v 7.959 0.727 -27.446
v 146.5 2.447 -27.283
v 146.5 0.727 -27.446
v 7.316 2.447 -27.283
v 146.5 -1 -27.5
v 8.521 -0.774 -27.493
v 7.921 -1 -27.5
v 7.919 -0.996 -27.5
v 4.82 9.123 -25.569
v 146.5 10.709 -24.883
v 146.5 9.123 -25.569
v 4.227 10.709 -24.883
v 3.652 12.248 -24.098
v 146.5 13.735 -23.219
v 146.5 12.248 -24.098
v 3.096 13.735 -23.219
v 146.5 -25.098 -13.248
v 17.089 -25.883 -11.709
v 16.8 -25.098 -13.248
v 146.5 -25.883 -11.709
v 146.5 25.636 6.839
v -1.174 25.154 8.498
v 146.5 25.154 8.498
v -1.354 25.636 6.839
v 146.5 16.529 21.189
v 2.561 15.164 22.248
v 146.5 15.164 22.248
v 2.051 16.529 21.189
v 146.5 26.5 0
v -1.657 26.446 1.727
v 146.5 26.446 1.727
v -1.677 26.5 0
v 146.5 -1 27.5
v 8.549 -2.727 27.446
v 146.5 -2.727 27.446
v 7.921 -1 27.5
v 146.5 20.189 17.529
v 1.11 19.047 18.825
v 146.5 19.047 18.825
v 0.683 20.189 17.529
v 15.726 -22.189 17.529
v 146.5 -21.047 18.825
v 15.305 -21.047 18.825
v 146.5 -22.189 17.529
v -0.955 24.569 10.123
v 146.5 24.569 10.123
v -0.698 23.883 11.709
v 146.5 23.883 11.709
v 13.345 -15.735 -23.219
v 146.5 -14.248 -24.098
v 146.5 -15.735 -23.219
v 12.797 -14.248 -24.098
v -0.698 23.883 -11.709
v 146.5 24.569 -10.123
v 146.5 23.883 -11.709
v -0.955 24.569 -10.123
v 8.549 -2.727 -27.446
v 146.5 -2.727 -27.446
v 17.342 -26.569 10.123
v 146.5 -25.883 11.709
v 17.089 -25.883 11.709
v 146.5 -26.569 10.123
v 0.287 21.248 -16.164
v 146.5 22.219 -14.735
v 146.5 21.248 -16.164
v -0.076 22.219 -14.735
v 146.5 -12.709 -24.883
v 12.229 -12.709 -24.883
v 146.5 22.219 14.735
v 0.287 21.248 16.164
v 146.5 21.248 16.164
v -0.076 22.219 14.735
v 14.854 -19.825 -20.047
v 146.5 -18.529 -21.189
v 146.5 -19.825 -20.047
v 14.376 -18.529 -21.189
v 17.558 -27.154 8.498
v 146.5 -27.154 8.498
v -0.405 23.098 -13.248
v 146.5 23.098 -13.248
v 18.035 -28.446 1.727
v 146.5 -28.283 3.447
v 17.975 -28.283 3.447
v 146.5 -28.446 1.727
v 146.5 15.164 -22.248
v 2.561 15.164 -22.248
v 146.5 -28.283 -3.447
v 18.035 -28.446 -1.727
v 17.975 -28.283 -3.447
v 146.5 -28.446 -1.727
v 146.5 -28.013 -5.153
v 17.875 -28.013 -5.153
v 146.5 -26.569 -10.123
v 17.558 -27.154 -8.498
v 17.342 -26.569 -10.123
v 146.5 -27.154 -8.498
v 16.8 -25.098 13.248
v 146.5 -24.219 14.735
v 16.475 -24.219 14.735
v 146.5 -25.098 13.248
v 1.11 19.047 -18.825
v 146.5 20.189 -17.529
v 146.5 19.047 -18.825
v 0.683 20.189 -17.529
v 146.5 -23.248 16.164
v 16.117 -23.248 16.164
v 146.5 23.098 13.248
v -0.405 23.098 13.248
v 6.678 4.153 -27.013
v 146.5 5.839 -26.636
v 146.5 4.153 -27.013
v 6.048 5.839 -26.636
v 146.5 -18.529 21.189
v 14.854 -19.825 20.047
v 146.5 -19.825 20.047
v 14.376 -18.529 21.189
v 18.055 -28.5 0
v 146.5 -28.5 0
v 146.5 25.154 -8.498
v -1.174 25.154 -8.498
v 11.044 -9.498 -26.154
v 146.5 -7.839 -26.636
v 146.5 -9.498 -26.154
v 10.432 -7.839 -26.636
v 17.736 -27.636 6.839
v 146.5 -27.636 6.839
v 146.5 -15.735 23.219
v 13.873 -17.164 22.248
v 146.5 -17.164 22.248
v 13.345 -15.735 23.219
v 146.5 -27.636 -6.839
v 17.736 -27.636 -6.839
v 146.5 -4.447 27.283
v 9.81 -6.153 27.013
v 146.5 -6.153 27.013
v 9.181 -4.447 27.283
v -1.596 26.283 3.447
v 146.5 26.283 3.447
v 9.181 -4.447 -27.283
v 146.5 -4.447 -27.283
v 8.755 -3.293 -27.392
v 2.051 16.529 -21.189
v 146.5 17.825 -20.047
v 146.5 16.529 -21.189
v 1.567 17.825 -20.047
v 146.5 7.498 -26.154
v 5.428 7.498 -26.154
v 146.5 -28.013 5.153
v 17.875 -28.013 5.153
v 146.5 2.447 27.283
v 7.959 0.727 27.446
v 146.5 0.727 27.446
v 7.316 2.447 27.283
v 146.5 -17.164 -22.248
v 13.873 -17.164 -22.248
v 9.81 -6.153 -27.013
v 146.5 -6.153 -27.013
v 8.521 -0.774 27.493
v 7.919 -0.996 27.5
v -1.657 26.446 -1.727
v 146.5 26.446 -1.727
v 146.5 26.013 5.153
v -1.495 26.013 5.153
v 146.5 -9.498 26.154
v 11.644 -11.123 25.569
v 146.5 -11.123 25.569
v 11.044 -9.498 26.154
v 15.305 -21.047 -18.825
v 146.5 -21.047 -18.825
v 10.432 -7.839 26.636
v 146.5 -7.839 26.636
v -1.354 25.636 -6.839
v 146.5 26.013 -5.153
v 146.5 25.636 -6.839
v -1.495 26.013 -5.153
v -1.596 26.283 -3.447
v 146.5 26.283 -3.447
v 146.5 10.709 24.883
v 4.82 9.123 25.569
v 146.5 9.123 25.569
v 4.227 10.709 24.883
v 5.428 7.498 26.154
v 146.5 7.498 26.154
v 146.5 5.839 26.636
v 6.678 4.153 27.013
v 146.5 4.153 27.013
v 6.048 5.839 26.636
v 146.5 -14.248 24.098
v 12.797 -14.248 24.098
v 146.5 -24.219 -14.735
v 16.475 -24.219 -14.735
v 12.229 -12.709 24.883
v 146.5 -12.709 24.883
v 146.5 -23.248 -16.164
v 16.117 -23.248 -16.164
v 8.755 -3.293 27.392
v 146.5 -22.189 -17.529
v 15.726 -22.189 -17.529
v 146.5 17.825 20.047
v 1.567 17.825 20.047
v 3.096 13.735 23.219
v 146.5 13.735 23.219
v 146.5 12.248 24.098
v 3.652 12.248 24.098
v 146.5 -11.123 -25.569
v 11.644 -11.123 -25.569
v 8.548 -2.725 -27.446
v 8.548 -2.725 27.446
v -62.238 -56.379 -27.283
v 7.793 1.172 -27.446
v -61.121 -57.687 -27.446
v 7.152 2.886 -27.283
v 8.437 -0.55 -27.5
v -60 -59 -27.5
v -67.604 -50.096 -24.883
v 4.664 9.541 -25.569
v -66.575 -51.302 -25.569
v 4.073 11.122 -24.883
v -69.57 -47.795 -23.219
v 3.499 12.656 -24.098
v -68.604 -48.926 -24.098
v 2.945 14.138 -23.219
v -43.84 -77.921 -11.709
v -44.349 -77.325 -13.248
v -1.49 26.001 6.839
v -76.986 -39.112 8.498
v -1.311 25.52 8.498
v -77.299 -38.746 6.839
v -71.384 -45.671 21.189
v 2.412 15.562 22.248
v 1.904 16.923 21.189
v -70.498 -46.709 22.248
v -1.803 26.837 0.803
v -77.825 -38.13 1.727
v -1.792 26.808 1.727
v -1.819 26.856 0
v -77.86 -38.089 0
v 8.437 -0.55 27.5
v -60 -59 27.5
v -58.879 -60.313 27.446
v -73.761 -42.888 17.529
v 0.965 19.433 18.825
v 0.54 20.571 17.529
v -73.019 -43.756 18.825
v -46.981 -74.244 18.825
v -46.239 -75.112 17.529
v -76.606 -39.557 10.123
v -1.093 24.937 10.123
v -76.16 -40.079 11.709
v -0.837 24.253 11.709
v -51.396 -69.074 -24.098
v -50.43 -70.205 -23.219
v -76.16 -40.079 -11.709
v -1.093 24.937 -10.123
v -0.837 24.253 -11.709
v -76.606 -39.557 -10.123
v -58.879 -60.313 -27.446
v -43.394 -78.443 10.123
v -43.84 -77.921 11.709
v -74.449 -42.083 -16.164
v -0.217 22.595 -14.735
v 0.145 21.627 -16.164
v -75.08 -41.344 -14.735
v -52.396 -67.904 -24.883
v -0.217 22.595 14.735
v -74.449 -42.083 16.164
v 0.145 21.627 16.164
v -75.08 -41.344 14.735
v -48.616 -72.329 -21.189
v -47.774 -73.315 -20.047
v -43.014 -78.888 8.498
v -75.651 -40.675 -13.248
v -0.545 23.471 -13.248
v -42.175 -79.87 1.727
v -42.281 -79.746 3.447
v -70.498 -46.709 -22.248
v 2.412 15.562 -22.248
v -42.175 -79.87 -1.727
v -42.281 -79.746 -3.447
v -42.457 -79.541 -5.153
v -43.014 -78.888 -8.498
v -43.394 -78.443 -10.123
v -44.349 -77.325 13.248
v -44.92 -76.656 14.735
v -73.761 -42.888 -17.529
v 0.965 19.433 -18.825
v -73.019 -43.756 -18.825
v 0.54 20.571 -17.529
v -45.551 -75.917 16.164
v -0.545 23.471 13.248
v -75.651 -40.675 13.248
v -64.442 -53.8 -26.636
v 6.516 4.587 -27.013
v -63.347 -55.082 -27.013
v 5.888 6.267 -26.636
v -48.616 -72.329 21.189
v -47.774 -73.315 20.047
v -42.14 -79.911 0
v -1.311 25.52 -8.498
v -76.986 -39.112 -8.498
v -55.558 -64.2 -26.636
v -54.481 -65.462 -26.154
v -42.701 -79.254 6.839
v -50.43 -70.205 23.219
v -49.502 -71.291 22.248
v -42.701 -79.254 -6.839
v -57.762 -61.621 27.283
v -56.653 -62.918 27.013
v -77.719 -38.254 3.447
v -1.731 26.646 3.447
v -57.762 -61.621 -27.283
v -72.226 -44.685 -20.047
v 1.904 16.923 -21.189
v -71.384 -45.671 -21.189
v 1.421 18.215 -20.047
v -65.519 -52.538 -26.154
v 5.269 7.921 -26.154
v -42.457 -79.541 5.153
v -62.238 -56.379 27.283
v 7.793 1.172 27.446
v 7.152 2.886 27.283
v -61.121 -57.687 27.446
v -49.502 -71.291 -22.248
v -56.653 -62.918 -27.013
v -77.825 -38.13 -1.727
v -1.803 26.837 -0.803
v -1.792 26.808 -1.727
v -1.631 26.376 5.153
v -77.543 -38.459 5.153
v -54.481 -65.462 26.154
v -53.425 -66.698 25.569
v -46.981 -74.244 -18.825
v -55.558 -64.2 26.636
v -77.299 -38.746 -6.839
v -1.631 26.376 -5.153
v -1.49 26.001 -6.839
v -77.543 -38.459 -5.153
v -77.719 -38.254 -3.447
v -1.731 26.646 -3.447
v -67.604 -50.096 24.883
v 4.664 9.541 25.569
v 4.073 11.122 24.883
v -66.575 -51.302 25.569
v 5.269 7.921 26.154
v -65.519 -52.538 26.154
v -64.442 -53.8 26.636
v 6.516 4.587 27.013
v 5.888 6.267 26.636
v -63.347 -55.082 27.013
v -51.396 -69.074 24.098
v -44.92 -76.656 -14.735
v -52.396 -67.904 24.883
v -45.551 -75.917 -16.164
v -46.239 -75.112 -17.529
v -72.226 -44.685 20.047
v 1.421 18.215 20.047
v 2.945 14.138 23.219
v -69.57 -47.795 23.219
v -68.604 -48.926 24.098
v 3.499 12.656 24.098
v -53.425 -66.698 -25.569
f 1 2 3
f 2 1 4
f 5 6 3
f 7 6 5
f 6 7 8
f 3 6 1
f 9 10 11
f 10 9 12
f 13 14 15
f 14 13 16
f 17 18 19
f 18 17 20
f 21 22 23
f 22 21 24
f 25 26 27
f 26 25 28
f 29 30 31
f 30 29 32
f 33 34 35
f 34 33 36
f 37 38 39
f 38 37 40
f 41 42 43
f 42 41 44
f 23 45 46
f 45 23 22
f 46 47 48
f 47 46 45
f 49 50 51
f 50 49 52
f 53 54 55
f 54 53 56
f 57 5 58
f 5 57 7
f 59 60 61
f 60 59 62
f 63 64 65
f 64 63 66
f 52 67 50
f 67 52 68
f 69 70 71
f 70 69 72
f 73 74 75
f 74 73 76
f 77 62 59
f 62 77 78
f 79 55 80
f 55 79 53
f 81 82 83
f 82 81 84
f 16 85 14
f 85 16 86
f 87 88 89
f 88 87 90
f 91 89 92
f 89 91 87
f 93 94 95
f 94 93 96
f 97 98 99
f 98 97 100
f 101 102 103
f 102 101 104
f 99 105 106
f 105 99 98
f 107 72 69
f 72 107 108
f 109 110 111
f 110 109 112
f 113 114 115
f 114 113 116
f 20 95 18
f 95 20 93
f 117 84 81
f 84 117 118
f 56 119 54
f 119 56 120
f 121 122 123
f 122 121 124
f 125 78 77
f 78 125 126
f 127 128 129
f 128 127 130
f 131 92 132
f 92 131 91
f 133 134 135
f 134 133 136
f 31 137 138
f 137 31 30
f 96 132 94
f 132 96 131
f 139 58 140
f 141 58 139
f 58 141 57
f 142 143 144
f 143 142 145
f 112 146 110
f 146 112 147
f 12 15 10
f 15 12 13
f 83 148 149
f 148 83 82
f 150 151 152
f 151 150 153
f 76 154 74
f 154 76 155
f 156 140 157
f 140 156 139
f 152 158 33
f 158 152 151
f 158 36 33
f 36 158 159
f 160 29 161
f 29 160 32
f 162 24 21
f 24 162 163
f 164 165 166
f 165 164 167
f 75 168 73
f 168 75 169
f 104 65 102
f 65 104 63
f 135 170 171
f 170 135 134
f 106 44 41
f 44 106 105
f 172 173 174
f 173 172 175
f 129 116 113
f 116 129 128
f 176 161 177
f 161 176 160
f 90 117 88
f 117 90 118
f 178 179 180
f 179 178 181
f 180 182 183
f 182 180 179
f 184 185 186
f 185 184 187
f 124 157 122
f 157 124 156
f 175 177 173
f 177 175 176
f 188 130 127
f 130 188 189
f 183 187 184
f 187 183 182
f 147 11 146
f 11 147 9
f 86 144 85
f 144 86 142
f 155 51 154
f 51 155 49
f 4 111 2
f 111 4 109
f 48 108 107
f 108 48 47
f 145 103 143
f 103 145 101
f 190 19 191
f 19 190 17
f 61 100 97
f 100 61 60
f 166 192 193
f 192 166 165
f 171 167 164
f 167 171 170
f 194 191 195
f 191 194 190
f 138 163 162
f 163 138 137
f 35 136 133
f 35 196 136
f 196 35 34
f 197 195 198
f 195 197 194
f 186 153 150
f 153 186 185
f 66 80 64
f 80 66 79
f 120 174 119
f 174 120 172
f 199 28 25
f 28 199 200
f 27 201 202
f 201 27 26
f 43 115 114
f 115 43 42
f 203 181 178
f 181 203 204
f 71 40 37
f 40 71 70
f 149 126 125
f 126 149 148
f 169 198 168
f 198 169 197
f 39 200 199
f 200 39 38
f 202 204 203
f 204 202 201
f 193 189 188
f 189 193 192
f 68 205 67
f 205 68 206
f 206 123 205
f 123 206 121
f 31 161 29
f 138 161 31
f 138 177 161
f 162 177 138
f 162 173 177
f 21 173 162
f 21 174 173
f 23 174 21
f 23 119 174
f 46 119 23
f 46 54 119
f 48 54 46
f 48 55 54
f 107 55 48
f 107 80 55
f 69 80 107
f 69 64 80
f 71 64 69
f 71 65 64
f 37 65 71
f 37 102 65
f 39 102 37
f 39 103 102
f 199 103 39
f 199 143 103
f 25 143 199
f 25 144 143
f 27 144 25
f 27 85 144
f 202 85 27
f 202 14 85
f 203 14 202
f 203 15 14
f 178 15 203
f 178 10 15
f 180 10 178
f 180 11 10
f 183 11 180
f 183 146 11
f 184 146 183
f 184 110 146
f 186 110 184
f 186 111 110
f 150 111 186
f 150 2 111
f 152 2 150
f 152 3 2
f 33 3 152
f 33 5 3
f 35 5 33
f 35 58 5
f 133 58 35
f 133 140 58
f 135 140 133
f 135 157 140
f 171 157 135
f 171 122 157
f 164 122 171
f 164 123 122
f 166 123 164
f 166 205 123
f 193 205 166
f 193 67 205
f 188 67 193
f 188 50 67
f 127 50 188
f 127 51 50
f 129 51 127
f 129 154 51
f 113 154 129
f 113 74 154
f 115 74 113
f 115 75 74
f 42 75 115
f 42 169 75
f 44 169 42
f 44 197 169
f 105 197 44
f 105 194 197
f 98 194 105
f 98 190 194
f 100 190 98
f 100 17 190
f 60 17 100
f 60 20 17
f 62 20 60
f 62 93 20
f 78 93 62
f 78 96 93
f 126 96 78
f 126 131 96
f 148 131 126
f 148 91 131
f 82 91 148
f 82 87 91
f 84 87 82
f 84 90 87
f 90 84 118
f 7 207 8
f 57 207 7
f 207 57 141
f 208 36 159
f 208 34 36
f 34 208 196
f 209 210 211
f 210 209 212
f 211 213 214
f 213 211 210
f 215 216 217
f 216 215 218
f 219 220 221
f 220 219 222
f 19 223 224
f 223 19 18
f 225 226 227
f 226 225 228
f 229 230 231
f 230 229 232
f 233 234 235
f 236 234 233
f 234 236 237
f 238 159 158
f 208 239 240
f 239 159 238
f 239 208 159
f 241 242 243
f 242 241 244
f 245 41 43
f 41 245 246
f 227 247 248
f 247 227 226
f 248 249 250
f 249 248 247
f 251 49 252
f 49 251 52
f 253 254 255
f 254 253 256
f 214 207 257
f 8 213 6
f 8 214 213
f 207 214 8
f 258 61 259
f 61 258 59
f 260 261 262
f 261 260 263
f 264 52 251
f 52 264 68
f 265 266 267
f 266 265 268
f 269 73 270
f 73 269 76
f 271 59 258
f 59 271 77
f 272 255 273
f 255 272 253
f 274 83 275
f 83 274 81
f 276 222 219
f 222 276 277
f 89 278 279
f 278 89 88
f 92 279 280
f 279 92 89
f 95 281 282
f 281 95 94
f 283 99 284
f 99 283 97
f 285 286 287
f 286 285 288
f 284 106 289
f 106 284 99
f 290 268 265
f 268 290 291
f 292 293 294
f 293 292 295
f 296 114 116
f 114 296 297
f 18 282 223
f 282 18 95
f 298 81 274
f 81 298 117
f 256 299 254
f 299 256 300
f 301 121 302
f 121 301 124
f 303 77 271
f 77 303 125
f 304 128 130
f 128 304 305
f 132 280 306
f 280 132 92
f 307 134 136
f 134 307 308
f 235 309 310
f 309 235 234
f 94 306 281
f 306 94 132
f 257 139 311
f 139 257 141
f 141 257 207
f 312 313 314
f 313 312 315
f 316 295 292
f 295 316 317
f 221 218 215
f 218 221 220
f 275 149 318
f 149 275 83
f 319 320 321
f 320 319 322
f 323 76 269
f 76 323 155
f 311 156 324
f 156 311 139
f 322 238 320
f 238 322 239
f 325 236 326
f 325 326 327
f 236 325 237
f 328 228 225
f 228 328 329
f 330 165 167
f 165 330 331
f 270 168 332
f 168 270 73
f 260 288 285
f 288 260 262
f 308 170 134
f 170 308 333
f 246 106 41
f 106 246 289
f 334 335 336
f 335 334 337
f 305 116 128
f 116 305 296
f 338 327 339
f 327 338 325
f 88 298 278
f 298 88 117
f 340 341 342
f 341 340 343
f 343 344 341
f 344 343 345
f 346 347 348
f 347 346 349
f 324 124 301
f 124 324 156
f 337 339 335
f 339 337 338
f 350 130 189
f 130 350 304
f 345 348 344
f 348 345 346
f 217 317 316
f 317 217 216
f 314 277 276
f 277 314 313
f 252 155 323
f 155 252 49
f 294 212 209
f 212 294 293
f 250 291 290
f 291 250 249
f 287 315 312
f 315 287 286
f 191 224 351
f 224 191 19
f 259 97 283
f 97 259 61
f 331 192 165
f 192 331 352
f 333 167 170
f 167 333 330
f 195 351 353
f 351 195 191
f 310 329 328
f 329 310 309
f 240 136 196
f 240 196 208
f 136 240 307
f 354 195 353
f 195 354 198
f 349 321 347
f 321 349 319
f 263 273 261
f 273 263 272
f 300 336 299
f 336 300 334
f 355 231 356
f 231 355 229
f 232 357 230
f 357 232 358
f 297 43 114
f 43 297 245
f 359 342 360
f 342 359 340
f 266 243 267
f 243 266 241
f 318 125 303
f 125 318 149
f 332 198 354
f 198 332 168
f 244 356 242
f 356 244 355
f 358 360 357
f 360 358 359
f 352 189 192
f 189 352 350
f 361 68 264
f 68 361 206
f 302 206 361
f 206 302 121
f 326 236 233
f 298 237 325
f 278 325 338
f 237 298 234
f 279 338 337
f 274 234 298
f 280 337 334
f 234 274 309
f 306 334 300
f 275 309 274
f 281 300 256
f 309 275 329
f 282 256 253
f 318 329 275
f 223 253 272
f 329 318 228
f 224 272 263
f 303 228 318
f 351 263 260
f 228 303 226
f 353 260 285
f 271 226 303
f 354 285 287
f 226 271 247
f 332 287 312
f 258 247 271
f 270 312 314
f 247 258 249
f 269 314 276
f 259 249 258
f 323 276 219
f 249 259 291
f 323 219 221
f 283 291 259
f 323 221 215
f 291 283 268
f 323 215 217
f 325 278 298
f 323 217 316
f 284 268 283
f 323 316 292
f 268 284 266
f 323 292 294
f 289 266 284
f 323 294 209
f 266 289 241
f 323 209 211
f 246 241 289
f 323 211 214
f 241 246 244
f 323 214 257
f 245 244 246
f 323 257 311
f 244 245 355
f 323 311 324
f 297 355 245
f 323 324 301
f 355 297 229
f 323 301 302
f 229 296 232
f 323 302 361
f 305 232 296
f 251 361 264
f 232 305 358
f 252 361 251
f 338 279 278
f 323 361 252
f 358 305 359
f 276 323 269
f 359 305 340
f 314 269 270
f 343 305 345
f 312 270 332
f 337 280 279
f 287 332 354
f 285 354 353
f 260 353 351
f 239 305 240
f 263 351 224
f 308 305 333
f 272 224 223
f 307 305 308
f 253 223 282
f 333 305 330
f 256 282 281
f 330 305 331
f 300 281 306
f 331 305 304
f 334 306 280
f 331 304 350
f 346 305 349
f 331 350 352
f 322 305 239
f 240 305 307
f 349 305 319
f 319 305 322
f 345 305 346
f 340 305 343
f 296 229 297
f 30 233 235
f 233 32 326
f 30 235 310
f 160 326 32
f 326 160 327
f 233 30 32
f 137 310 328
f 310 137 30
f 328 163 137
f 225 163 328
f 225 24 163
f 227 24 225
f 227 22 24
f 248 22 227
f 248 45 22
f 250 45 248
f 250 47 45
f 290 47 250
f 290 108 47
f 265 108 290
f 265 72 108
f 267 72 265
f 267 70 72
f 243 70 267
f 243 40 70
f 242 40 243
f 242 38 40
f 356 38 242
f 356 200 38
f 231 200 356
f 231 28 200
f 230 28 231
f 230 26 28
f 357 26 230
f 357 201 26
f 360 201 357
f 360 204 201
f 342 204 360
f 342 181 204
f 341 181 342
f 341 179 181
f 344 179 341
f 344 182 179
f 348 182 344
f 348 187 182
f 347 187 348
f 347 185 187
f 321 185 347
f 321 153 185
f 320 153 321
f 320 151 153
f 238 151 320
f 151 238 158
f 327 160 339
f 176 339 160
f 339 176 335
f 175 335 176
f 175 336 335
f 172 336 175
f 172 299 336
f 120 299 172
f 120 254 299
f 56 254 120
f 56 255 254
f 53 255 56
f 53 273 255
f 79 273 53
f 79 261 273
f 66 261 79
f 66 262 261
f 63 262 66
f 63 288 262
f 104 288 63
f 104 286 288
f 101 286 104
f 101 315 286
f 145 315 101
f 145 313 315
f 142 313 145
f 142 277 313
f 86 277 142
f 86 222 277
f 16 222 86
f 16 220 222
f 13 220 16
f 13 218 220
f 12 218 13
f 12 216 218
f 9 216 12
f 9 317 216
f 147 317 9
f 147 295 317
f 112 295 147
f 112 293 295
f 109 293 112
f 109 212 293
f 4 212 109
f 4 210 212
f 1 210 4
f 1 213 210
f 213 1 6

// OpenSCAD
// file: variables.scad
circBrdT = 1.59; //exact
circBrdSolderSpace = 3;
ledBrdW = circBrdT + 0.4;
ledBrdL = 14.91;
ledBrdH = 14.91;
ledHousingD = 5.5 + 0.4;
ledHousingW = 9.58; 
microCtlrHousingW = 50.84 + 1; 
microCtlrHousingL = 30.5 + 1; 
microCtlrHousingH = 19 + 1; 
switchHousingW = 22.44 + 1; 
switchHousingL = 38.03 + 1;
switchHousingH = 10.13 + 1; 
cnvrtrHousingW = 7.04 + 0.4; 
cnvrtrHousingL = 37.15 + 1; 
cnvrtrHousingH = 17.15 + 0.6; 
batteryHousingW = 18.05; 
batteryHousingL = 66.91; 
batteryHousingH = 18.05; 
sideT = 2;
gunPieceBotH = 20;
gunPieceNozzleW = 55;
gunPieceNozzleL = 150;
gunPieceHandleW = 55;
gunPieceHandleL = 100;
batteryContactsW = 23.94 + 0.4;
batteryContactsH = circBrdT + 0.4;
// file: base_modules.scad
//dimensions = [number of edges, distance from corner to center, height]
module n_edged_block(dimensions) {
    n = dimensions[0];
    r = dimensions[1];
    height = dimensions[2];
    angles = [ for (i = [0:n-1]) i*(360/n) ];
    coords = [ for (th=angles) [r*cos(th), r*sin(th)] ];
    linear_extrude(height, convexity = 10)
        polygon(coords);
}

//dimensions = [lower diameter, upper diameter, height]
module solid_cylinder(dimensions) {
    translate([0, 0, dimensions[2]/2])
        cylinder(dimensions[2], d1= dimensions[0], d2 = dimensions[1], center = true, $fn = 100);
}

//dimensions = [diameter of cylinder, elongation from center, height]
module elongated_cylinder(dimensions) {
    radius = dimensions[0]/2;
    for (i = [-1 : 2 : 1]) translate([i * dimensions[1]/2, 0, 0])
        cylinder(dimensions[2], radius, radius, $fn=100);
    #solid_block([dimensions[1], dimensions[0], dimensions[2]]);
}

//dimensions = [width(x), length(y), height(z)]
module solid_block(dimensions) {
    translate([0, 0, dimensions[2]/2])
        cube(dimensions, true);
}

//dimensions = [width(x), length(y), height(z)]
//chamferWidth = width of cut on bottom corners
module solid_block_chamferred(dimensions, chamferWidth = 0) {
    difference() {
        solid_block(dimensions);
        for (i = [0 : 1]) {
            translate([(i%2)*(dimensions[0]-chamferWidth)/2, (1-i%2)*(dimensions[1]-chamferWidth)/2, chamferWidth/2])
            rotate([-135*(1-i%2), 135*(i%2), 0])
                solid_block(
                            [(1-i%2)*dimensions[0] + (i%2)*chamferWidth*2, 
                             (i%2)*dimensions[1] + (1-i%2)*chamferWidth*2, 
                             chamferWidth]);
            translate([-(i%2)*(dimensions[0]-chamferWidth)/2, -(1-i%2)*(dimensions[1]-chamferWidth)/2, chamferWidth/2])
            rotate([135*(1-i%2), -135*(i%2), 0])
                solid_block(
                            [(1-i%2)*dimensions[0] + (i%2)*chamferWidth*2, 
                             (i%2)*dimensions[1] + (1-i%2)*chamferWidth*2, 
                             chamferWidth]);
        }
    }
}

//mainly used for subtration
//dimensions = [width(x), length(y)]
//chamferWidth = height and extra width that is meant to be subtracted
module inner_chamferring(dimensions, chamferWidth = 0) {
    dimensions = [dimensions[0]+chamferWidth*2, dimensions[1]+chamferWidth*2, chamferWidth];
    difference() {
        solid_block(dimensions);
        for (i = [0 : 1]) {
            translate([(i%2)*(dimensions[0]-chamferWidth)/2, (1-i%2)*(dimensions[1]-chamferWidth)/2, chamferWidth/2])
            rotate([-45*(1-i%2), 45*(i%2), 0])
                solid_block(
                            [(1-i%2)*dimensions[0] + (i%2)*chamferWidth*2, 
                             (i%2)*dimensions[1] + (1-i%2)*chamferWidth*2, 
                             chamferWidth]);
            translate([-(i%2)*(dimensions[0]-chamferWidth)/2, -(1-i%2)*(dimensions[1]-chamferWidth)/2, chamferWidth/2])
            rotate([45*(1-i%2), -45*(i%2), 0])
                solid_block(
                            [(1-i%2)*dimensions[0] + (i%2)*chamferWidth*2, 
                             (i%2)*dimensions[1] + (1-i%2)*chamferWidth*2, 
                             chamferWidth]);
        }
    }
}

//for bigger modules, copy and paste and replace __format__ with the name of the module you are creating
module _format_(shift = [0, 0, 0], rotation = [0, 0, 0]) {
    translate(shift) { rotate(rotation) {
    
    
    
    
    
    }}
}
// main file
use <base_modules.scad>
include<variables.scad>

body();
handle();

module body(){
    translate([-3.5, -1, 0]){
        
    rotate([0, 90, 0])
        difference(){
                    solid_cylinder([gunPieceNozzleW, gunPieceNozzleW, gunPieceNozzleL]);
                    translate([-5, -6 ,-13]) rotate([-20, 0, 0])
                        #solid_block([gunPieceHandleW+10, gunPieceHandleW +10, 25]);
            
                }
     }
}

module handle(){
    translate([-60, -59, 0]){
        rotate([0, 90, 40.5])
            difference(){
                solid_cylinder([gunPieceHandleW, gunPieceHandleW, gunPieceHandleL]);
                translate([0, 0 ,gunPieceHandleL-10]) rotate([20, 0, 0])
                    #solid_block([gunPieceHandleW+5, gunPieceHandleW +5, 20]);
            
            }
    }
 }
    
